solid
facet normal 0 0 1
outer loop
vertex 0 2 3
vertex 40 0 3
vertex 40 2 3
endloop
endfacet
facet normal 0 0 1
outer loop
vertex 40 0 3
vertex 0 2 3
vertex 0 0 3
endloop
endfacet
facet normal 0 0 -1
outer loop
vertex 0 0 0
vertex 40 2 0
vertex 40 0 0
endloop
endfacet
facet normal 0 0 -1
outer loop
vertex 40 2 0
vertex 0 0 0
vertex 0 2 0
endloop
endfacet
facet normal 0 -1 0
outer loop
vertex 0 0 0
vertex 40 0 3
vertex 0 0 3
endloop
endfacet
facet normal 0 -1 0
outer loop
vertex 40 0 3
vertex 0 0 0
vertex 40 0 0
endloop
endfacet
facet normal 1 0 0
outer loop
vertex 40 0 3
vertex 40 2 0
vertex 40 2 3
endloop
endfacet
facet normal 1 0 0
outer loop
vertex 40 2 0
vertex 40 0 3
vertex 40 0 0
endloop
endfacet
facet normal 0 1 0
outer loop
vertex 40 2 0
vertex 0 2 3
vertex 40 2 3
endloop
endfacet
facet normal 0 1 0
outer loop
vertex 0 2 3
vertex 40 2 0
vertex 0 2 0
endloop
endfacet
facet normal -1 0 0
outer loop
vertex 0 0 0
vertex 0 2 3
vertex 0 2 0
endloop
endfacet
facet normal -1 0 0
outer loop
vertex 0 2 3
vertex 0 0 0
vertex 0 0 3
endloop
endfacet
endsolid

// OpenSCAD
// Unsaved Native Agent acceptance buffer
width=40;
module model() { cube([width,2,3]); }
model();
